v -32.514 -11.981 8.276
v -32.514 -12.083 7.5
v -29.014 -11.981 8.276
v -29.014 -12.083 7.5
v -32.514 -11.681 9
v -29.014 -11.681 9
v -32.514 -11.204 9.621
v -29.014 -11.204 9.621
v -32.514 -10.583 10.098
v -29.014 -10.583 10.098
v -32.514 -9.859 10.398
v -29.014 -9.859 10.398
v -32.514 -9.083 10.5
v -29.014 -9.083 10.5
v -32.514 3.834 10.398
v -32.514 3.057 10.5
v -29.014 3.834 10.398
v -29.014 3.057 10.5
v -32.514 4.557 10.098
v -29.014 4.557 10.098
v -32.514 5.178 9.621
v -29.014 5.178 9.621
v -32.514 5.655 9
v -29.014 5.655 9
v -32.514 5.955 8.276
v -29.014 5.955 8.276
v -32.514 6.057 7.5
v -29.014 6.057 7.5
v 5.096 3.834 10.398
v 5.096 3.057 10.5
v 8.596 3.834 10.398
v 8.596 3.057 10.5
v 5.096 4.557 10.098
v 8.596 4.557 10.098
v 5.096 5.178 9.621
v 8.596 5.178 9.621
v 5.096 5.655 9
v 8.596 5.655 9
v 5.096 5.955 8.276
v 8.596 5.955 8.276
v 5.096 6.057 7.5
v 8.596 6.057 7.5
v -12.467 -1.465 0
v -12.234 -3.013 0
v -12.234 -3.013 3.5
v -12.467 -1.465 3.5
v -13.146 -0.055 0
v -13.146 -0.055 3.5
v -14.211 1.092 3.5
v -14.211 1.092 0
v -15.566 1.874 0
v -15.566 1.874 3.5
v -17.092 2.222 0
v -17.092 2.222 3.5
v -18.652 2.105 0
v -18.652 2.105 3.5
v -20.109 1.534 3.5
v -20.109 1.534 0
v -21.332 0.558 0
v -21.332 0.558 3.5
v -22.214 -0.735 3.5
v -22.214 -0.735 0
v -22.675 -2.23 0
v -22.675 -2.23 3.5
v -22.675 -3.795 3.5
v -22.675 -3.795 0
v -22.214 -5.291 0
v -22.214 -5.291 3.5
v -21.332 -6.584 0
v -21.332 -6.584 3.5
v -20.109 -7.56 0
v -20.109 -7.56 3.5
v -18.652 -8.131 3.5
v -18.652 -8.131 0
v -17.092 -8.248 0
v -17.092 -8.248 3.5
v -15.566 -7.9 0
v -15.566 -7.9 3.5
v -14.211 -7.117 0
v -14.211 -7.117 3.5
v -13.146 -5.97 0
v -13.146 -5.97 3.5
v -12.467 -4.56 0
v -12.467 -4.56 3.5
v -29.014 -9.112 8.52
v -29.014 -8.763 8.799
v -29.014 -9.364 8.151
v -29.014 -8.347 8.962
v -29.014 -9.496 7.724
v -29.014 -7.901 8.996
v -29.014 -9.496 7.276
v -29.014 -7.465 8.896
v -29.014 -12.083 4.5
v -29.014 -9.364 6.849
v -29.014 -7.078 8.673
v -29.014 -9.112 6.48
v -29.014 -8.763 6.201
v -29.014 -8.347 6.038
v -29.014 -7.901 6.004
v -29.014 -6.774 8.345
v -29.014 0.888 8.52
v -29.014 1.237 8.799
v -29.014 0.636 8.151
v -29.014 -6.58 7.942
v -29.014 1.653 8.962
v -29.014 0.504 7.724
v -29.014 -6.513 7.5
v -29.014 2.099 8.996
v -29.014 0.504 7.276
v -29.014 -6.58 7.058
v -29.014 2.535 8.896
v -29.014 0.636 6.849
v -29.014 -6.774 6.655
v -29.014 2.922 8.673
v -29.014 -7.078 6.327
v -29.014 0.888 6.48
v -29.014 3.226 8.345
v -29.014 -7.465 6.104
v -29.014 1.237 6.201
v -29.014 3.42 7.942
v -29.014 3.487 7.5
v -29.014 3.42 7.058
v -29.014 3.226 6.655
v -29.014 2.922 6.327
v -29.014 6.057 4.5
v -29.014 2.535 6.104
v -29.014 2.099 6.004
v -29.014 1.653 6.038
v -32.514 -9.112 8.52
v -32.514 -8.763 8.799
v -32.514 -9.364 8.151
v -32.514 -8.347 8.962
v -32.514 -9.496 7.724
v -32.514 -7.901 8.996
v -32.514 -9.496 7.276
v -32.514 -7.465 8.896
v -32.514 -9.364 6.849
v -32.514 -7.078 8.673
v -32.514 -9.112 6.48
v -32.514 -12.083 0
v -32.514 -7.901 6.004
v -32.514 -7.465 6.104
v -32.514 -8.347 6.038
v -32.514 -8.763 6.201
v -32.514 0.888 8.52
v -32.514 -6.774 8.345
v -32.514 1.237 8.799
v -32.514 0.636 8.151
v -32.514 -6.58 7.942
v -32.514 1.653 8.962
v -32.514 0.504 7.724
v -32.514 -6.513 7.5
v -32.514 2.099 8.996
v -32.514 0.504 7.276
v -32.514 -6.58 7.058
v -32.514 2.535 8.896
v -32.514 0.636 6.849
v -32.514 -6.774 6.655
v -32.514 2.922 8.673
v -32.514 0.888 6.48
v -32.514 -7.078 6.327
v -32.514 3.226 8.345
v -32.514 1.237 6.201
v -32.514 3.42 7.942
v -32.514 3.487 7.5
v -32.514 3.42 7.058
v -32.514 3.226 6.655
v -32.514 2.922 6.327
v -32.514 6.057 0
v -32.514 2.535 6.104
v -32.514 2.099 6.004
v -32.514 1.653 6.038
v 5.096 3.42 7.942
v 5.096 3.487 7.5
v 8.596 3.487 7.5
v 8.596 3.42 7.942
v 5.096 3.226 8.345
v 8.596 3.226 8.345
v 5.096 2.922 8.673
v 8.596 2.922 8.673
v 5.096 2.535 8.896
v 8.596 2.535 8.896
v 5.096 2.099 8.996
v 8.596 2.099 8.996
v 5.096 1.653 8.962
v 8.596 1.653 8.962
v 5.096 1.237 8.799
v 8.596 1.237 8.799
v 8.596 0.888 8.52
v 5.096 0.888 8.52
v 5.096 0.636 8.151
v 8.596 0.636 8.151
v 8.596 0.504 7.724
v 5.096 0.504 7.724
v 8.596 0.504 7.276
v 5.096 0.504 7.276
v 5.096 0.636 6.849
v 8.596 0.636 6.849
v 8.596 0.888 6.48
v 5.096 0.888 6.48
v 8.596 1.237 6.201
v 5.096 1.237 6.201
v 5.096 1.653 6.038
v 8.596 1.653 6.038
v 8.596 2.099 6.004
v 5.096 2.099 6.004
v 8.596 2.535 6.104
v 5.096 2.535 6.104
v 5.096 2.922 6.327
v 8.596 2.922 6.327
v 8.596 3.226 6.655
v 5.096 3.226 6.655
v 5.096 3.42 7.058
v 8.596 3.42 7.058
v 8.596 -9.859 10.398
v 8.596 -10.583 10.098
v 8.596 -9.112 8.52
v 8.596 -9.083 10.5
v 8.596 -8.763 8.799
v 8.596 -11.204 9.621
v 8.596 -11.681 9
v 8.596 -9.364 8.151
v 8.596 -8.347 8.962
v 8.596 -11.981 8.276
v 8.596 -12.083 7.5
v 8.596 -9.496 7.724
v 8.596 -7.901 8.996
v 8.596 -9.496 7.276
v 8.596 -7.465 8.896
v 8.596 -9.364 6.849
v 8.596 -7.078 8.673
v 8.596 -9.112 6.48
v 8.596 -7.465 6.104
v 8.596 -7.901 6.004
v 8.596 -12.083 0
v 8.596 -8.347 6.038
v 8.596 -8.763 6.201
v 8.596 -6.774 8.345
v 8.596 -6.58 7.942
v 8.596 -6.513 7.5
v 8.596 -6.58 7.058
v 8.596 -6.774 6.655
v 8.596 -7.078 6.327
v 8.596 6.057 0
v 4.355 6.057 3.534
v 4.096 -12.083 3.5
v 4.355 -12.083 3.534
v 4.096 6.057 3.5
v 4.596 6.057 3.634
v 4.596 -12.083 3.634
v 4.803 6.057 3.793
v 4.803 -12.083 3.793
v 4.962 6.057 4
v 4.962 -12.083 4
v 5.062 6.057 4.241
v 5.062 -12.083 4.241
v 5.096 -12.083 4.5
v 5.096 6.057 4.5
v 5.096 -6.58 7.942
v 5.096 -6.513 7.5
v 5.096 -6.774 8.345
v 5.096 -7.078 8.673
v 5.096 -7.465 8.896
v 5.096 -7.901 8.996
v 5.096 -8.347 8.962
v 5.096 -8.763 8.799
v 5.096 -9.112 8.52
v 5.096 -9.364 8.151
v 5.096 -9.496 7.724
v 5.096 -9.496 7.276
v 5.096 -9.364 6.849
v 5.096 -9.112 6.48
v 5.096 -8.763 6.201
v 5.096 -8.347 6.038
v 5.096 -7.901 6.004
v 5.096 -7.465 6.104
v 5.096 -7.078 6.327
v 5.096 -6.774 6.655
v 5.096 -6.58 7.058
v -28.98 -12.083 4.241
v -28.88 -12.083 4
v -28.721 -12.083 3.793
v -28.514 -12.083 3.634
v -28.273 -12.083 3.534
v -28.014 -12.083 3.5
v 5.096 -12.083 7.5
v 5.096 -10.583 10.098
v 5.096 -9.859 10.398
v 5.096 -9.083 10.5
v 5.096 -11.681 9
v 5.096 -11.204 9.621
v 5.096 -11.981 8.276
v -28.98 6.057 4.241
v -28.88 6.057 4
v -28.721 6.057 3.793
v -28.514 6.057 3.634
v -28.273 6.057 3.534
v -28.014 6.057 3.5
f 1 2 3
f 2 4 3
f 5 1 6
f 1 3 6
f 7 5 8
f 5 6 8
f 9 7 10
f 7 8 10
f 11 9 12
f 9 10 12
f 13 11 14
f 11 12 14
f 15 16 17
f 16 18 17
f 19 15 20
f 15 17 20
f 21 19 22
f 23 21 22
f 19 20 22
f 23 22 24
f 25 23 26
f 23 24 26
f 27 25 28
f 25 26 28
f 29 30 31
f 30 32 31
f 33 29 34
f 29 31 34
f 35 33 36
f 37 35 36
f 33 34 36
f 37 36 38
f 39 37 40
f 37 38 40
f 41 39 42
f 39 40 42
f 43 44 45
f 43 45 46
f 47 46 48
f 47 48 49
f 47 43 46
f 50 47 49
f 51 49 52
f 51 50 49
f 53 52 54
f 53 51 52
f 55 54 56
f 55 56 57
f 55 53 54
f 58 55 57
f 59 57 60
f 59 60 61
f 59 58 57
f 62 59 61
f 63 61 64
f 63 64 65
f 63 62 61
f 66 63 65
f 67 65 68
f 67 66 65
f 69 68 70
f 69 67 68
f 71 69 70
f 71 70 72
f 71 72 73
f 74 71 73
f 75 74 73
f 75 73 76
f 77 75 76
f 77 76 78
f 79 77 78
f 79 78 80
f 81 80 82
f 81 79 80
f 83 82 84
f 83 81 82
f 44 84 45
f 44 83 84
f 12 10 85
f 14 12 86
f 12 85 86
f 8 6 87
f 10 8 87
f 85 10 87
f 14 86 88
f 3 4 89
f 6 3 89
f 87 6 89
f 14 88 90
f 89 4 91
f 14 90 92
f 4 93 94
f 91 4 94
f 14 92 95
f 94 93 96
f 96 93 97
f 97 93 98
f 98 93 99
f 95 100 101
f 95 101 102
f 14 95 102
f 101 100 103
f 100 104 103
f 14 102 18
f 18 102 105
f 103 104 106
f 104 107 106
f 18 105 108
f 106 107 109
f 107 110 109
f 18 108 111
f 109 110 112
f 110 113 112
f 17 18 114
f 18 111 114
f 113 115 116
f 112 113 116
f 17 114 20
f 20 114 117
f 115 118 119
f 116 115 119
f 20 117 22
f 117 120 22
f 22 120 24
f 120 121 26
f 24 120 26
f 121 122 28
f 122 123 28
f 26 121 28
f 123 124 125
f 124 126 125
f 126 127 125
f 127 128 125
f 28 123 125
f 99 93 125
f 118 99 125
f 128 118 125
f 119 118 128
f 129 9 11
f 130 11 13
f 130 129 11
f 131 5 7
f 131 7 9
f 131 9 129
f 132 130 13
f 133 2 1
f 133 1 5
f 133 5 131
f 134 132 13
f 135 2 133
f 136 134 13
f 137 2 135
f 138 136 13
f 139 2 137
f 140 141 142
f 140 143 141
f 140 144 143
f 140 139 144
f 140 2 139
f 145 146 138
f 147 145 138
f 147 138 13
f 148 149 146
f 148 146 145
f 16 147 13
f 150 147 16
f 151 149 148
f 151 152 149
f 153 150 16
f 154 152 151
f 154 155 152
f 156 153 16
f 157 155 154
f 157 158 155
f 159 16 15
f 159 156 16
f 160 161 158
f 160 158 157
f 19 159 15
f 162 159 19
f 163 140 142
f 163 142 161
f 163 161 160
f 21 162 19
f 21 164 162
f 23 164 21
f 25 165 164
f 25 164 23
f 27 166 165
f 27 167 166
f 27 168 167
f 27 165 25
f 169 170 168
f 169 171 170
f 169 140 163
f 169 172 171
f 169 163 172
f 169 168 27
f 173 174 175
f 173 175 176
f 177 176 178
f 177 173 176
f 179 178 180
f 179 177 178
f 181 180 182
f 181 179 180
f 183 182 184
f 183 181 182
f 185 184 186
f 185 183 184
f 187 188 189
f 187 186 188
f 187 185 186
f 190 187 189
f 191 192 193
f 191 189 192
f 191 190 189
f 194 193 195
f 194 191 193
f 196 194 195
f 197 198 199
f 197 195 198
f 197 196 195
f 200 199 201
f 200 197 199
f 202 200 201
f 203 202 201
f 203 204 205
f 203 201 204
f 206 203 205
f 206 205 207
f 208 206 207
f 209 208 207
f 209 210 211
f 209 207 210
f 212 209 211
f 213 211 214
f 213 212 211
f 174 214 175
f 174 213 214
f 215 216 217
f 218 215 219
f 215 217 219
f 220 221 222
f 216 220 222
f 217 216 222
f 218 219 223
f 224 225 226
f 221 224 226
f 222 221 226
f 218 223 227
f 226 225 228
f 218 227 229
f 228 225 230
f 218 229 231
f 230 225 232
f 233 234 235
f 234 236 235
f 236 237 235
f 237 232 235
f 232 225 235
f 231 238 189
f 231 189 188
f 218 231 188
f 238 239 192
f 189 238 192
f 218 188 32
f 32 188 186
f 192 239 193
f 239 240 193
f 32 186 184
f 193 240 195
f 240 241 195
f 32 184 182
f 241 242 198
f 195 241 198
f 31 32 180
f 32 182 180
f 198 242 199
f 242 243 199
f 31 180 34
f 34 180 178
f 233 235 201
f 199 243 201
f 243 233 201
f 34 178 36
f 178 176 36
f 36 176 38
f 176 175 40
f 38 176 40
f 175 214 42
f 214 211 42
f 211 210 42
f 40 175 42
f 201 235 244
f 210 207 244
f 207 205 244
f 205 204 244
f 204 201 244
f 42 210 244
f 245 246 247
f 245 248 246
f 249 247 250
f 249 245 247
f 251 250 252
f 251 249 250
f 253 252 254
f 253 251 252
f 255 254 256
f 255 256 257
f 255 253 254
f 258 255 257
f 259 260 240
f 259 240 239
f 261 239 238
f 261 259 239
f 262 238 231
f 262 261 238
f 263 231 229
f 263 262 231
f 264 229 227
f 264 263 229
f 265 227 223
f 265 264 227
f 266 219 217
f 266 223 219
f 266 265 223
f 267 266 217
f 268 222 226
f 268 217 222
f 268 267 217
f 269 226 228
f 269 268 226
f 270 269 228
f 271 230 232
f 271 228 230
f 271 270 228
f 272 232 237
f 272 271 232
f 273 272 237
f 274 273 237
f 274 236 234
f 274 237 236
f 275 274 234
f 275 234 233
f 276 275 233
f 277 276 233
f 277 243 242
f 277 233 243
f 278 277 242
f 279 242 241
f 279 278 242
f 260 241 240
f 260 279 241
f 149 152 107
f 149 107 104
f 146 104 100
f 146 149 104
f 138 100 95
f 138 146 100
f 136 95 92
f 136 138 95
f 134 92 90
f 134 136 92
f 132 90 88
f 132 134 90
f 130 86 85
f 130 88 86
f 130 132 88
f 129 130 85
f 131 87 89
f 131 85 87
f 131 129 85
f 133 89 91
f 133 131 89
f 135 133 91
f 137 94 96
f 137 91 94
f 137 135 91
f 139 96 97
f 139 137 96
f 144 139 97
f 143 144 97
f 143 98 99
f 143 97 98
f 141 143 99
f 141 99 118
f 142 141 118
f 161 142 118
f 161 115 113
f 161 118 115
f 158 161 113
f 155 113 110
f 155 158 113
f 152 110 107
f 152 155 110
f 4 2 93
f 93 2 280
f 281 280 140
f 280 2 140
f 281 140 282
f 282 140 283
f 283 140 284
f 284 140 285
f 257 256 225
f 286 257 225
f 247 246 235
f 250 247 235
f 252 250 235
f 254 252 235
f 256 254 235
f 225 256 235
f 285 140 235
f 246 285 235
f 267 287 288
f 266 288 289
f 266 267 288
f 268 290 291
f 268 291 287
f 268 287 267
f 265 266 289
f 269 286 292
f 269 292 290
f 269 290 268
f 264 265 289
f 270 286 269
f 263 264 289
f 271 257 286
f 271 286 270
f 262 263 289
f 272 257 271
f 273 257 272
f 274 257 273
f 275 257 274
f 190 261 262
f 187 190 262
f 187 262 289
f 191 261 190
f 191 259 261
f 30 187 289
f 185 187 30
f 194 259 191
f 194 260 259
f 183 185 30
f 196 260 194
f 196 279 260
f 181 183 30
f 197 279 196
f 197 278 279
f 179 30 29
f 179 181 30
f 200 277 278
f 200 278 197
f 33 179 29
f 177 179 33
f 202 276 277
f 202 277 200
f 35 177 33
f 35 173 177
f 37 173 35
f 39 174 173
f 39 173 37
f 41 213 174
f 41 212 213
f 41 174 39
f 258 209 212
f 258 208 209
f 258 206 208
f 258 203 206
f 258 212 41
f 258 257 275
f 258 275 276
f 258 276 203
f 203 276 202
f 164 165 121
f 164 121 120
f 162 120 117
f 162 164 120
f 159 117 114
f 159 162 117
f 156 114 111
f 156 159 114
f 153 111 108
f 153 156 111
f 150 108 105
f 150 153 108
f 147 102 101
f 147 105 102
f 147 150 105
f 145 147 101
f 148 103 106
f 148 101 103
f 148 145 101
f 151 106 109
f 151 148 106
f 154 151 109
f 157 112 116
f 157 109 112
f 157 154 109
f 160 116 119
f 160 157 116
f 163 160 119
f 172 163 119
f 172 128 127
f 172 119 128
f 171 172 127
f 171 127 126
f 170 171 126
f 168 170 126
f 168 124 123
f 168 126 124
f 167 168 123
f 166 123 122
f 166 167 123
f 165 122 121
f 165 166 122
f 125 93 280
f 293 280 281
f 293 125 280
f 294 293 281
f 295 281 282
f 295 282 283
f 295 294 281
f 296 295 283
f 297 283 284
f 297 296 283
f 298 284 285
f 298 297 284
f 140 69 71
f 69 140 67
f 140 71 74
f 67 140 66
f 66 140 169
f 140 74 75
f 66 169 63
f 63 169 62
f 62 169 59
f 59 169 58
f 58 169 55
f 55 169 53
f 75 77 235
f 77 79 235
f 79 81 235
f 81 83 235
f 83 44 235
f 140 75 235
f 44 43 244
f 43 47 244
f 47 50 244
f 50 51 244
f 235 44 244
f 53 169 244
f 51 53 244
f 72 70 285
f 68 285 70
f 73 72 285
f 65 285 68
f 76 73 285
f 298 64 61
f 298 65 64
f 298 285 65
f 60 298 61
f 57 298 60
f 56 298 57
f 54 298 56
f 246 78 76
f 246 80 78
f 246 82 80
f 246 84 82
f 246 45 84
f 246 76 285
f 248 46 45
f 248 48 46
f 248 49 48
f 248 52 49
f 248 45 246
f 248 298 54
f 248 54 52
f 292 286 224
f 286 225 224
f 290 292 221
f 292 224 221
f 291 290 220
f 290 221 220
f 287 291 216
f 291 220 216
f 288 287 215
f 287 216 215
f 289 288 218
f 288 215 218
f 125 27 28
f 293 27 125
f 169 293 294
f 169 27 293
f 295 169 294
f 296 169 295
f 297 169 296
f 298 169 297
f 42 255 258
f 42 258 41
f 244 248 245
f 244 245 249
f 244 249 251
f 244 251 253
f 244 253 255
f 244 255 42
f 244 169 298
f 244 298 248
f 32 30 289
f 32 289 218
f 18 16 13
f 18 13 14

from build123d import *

# Parameters (mm, degrees)
SKETCH_1_W               = 41.11
SKETCH_1_H               = 18.14
SKETCH_1_R               = 5.25
EXTRUDE_1_DEPTH          = 3.5
SKETCH_3_W               = 3.5
SKETCH_3_H               = 18.14
EXTRUDE_2_DEPTH          = 7
CUT_EXTRUDE_1_DEPTH      = 45.116640965
CUT_EXTRUDE_1_DEPTH_BACK = 45.116640965
SKETCH_4_R               = 1.5
FILLET_1_R               = 1
FILLET_2_R               = 3


with BuildPart() as part:
    # 草图1 → 凸台-拉伸1 (new body)
    with BuildSketch(Plane.XY):
        with Locations((-11.958959751, -3.012876727)):
            Rectangle(SKETCH_1_W, SKETCH_1_H)
        with Locations((-17.483959751, -3.012876727)):
            Circle(SKETCH_1_R, mode=Mode.SUBTRACT)
    extrude(amount=EXTRUDE_1_DEPTH)

    # 草图3 → 凸台-拉伸2 (add)
    with BuildSketch(Plane.XY.offset(3.5)):
        with Locations((-30.763959751, -3.012876727)):
            Rectangle(SKETCH_3_W, SKETCH_3_H)
        with Locations((6.846040249, -3.012876727)):
            Rectangle(SKETCH_3_W, SKETCH_3_H)
    extrude(amount=EXTRUDE_2_DEPTH)

    # 草图4 → 切除-拉伸1 (cut, two sides: drawn at the far end of the back side and taken through both)
    with BuildSketch(Plane(origin=(8.596040249, 0, 0), x_dir=(0, 0, -1), z_dir=(1, 0, 0)).offset(-CUT_EXTRUDE_1_DEPTH_BACK)):
        with Locations(Location((-7.5, 1.987123273, 0), (0, 0, 90))):
            Circle(SKETCH_4_R)
        with Locations(Location((-7.5, -8.012876727, 0), (0, 0, 90))):
            Circle(SKETCH_4_R)
    extrude(amount=CUT_EXTRUDE_1_DEPTH + CUT_EXTRUDE_1_DEPTH_BACK, mode=Mode.SUBTRACT)

    # 圆角1
    fillet_1_edges = [part.edges().sort_by_distance(p)[0] for p in [
        (-29.013959751, -3.012876727, 3.5),
        (5.096040249, -3.012876727, 3.5),
    ]]
    fillet(fillet_1_edges, radius=FILLET_1_R)

    # 圆角2
    fillet_2_edges = [part.edges().sort_by_distance(p)[0] for p in [
        (-30.763959751, -12.082876727, 10.5),
        (-30.763959751, 6.057123273, 10.5),
        (6.846040249, 6.057123273, 10.5),
        (6.846040249, -12.082876727, 10.5),
    ]]
    fillet(fillet_2_edges, radius=FILLET_2_R)


solid = part.part
